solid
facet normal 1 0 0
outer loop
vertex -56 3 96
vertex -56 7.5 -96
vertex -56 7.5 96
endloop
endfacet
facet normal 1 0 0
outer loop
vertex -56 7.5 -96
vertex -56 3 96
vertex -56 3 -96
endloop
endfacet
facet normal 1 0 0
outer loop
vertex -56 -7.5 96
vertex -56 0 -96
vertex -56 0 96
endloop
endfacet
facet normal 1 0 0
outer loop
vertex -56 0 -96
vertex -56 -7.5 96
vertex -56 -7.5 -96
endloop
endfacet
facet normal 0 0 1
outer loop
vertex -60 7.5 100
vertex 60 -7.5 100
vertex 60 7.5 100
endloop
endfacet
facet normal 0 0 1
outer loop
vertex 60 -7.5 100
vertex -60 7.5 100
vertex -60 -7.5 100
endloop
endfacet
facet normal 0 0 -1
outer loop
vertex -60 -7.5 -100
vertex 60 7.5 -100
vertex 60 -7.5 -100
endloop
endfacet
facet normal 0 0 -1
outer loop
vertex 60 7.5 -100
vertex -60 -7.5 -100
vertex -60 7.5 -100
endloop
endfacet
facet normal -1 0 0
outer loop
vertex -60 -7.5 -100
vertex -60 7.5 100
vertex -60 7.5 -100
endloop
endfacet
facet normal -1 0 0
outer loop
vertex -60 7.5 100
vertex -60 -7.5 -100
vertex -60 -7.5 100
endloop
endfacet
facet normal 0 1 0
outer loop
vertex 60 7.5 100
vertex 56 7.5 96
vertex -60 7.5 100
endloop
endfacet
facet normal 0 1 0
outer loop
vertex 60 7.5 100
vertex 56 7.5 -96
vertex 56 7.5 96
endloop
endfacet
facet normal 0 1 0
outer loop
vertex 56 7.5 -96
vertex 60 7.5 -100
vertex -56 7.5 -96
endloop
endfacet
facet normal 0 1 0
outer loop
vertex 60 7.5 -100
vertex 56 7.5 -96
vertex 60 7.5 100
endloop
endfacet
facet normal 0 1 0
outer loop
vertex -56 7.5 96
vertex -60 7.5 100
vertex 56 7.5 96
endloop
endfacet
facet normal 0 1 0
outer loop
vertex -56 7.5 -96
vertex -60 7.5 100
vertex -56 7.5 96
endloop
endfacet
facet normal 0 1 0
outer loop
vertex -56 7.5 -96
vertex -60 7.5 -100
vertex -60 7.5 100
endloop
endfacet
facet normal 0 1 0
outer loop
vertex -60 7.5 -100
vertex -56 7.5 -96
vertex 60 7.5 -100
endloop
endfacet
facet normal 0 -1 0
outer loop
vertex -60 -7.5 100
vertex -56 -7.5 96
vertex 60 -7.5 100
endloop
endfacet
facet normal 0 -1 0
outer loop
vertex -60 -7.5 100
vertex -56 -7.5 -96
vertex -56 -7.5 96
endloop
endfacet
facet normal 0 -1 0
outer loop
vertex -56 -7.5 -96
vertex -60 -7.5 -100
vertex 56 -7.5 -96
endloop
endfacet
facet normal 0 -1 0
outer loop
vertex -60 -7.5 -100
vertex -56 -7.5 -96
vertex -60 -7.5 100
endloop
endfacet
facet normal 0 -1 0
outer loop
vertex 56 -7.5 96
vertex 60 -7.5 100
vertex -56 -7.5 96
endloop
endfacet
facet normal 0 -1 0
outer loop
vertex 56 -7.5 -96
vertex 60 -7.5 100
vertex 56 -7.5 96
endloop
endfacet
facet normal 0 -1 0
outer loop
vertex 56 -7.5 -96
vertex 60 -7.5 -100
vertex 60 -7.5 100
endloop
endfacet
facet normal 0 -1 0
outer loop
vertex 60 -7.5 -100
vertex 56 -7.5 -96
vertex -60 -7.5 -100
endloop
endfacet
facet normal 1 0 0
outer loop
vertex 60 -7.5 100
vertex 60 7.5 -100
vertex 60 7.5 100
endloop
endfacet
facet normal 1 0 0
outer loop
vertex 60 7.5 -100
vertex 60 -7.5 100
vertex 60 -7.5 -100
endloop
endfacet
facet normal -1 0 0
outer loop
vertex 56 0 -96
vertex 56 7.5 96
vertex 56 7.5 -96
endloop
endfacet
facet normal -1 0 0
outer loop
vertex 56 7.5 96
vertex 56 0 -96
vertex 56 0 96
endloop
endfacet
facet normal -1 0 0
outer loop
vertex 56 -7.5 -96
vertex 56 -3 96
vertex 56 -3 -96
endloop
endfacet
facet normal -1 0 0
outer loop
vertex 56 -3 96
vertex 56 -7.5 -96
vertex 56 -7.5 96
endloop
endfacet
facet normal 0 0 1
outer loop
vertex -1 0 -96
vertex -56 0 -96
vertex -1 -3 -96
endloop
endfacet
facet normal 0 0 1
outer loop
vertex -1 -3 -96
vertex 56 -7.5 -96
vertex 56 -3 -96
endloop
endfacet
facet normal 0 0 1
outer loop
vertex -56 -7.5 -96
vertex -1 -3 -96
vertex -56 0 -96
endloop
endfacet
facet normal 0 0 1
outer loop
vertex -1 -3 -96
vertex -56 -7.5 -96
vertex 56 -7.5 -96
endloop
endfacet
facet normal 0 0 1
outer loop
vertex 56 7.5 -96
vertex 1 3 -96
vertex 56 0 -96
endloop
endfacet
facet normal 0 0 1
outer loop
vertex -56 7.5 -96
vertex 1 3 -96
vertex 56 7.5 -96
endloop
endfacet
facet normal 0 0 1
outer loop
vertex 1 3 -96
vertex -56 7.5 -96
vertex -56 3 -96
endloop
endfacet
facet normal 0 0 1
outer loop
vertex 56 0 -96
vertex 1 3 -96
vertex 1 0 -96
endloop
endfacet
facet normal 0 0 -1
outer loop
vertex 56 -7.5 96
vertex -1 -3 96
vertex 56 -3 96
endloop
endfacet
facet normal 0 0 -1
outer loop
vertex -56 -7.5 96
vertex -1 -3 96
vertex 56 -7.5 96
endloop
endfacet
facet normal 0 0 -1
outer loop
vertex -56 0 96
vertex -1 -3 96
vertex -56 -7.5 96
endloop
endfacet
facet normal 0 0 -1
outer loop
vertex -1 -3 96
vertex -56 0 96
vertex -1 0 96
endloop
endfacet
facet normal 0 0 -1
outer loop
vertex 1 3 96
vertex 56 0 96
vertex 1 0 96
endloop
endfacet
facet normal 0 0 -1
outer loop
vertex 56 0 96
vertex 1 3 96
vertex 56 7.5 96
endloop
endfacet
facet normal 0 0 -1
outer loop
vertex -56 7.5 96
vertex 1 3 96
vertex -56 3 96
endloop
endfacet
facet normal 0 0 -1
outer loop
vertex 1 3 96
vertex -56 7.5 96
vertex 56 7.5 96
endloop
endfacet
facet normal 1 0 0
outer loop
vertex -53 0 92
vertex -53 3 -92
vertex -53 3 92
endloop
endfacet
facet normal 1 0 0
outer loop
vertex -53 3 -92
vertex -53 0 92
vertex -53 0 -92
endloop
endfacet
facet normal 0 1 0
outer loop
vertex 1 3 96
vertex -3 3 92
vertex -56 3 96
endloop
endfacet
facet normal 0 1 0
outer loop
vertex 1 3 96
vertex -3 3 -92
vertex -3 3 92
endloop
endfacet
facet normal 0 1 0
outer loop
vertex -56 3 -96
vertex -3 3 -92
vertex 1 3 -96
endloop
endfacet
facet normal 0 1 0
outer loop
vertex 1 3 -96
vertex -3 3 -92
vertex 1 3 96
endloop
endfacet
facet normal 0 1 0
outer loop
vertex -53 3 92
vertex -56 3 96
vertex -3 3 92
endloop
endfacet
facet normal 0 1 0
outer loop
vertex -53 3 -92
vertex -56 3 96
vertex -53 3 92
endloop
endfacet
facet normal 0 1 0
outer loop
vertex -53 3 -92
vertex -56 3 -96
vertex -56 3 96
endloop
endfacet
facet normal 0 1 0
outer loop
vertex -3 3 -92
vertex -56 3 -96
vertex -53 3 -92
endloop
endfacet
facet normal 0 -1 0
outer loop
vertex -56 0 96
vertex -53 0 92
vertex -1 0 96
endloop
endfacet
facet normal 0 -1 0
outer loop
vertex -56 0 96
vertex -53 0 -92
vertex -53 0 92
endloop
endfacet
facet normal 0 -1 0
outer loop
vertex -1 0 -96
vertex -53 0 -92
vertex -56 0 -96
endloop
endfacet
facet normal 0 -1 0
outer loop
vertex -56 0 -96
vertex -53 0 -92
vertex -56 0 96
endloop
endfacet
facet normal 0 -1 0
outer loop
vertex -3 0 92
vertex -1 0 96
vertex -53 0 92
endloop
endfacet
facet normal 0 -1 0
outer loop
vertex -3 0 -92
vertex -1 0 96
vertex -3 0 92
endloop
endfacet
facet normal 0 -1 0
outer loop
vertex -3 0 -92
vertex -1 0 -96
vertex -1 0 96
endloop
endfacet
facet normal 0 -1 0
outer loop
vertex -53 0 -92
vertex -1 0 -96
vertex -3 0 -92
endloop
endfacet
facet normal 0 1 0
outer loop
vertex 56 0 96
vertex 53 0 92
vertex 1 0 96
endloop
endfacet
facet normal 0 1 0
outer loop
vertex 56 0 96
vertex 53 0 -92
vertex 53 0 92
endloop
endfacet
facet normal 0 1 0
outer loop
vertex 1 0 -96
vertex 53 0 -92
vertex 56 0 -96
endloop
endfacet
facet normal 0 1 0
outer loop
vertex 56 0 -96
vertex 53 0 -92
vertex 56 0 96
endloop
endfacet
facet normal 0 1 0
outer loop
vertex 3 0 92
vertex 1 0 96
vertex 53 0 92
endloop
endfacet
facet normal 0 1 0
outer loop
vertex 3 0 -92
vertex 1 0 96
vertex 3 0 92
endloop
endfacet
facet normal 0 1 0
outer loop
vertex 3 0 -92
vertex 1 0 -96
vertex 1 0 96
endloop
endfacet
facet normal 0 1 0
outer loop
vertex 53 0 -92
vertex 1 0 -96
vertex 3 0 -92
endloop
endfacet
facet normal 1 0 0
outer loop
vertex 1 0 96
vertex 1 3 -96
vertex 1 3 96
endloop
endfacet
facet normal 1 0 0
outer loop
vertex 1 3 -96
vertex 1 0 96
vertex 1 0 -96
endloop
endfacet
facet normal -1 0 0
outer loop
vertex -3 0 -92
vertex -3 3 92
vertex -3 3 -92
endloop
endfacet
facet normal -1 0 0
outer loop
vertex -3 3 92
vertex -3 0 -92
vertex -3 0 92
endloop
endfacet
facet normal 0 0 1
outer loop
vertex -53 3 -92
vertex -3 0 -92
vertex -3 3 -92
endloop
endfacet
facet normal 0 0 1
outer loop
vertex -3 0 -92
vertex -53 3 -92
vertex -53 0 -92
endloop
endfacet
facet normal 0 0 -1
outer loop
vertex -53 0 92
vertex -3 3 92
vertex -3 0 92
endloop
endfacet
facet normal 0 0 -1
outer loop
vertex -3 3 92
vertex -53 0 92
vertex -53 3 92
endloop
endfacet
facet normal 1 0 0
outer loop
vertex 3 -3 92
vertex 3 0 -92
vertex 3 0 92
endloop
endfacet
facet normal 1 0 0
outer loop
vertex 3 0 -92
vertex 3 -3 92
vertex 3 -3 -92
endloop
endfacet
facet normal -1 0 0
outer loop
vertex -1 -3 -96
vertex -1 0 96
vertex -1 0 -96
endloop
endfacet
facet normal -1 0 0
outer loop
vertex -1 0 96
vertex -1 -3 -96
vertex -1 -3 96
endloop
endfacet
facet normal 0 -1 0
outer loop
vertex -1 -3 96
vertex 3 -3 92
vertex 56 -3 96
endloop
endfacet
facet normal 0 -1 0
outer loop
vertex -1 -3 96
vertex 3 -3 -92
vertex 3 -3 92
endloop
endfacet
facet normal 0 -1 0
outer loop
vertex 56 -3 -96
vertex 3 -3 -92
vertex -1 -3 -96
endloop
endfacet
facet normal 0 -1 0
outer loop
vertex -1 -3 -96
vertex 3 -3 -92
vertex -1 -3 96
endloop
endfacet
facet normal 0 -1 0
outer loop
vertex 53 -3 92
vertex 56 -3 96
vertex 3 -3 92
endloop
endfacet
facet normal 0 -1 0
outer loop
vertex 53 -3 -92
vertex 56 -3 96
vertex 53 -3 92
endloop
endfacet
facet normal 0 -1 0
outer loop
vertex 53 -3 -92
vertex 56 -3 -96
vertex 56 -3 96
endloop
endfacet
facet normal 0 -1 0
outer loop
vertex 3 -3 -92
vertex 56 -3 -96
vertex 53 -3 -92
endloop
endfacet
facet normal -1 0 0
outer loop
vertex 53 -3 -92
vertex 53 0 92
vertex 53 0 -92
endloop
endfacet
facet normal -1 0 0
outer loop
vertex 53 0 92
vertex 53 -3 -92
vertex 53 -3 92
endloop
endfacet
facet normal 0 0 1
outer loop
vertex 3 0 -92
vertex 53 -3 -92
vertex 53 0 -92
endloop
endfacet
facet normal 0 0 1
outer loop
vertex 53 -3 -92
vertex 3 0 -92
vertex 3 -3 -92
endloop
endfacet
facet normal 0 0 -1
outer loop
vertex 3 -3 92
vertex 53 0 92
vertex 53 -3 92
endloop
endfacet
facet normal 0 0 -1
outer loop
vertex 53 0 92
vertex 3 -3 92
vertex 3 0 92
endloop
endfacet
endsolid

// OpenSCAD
module slidingwindow(width=120, height=200, wall_thickness=15) 
{
    profile_width = 4;
    profile_depth = 3.0;
    frame_profile_width = 4;
    frame_profile_depth = wall_thickness;
    
    /* Outer frame fixed to convrete wall. */
    color([0.2,0.0,0.1])
    genericframe(width, height, frame_profile_width, frame_profile_depth);

    /* Calculate opning size. */
    open_w = width - 2 * frame_profile_width;
    open_h = height - 2 * frame_profile_width;
    half_open_w = (open_w + frame_profile_width)/2; 
    
    /* Left window glass frame. */
    translate([-(open_w)/4, profile_depth/2, 0]) 
    color([0.5,0.3,0.3])
    genericframe(half_open_w, open_h, profile_width, profile_depth);

    /* Right window glass frame. */
    translate([(open_w)/4, -profile_depth/2, 0]) 
    color([0.5,0.3,0.3])
    genericframe(half_open_w, open_h, profile_width, profile_depth);
}

module genericframe(width=70, height=110, profile_width = 5, profile_depth = 8) 
{
    translate([-(width - profile_width)/2, 0, 0]) 
    cube([profile_width,profile_depth, height], center=true);
    
    translate([(width - profile_width)/2, 0, 0]) 
    cube([profile_width,profile_depth, height], center=true);

    translate([0, 0, -(height - profile_width)/2]) 
    cube([width, profile_depth, profile_width], center=true);

    translate([0, 0, (height - profile_width)/2]) 
    cube([width, profile_depth, profile_width], center=true);
}    

// For testing
slidingwindow();
